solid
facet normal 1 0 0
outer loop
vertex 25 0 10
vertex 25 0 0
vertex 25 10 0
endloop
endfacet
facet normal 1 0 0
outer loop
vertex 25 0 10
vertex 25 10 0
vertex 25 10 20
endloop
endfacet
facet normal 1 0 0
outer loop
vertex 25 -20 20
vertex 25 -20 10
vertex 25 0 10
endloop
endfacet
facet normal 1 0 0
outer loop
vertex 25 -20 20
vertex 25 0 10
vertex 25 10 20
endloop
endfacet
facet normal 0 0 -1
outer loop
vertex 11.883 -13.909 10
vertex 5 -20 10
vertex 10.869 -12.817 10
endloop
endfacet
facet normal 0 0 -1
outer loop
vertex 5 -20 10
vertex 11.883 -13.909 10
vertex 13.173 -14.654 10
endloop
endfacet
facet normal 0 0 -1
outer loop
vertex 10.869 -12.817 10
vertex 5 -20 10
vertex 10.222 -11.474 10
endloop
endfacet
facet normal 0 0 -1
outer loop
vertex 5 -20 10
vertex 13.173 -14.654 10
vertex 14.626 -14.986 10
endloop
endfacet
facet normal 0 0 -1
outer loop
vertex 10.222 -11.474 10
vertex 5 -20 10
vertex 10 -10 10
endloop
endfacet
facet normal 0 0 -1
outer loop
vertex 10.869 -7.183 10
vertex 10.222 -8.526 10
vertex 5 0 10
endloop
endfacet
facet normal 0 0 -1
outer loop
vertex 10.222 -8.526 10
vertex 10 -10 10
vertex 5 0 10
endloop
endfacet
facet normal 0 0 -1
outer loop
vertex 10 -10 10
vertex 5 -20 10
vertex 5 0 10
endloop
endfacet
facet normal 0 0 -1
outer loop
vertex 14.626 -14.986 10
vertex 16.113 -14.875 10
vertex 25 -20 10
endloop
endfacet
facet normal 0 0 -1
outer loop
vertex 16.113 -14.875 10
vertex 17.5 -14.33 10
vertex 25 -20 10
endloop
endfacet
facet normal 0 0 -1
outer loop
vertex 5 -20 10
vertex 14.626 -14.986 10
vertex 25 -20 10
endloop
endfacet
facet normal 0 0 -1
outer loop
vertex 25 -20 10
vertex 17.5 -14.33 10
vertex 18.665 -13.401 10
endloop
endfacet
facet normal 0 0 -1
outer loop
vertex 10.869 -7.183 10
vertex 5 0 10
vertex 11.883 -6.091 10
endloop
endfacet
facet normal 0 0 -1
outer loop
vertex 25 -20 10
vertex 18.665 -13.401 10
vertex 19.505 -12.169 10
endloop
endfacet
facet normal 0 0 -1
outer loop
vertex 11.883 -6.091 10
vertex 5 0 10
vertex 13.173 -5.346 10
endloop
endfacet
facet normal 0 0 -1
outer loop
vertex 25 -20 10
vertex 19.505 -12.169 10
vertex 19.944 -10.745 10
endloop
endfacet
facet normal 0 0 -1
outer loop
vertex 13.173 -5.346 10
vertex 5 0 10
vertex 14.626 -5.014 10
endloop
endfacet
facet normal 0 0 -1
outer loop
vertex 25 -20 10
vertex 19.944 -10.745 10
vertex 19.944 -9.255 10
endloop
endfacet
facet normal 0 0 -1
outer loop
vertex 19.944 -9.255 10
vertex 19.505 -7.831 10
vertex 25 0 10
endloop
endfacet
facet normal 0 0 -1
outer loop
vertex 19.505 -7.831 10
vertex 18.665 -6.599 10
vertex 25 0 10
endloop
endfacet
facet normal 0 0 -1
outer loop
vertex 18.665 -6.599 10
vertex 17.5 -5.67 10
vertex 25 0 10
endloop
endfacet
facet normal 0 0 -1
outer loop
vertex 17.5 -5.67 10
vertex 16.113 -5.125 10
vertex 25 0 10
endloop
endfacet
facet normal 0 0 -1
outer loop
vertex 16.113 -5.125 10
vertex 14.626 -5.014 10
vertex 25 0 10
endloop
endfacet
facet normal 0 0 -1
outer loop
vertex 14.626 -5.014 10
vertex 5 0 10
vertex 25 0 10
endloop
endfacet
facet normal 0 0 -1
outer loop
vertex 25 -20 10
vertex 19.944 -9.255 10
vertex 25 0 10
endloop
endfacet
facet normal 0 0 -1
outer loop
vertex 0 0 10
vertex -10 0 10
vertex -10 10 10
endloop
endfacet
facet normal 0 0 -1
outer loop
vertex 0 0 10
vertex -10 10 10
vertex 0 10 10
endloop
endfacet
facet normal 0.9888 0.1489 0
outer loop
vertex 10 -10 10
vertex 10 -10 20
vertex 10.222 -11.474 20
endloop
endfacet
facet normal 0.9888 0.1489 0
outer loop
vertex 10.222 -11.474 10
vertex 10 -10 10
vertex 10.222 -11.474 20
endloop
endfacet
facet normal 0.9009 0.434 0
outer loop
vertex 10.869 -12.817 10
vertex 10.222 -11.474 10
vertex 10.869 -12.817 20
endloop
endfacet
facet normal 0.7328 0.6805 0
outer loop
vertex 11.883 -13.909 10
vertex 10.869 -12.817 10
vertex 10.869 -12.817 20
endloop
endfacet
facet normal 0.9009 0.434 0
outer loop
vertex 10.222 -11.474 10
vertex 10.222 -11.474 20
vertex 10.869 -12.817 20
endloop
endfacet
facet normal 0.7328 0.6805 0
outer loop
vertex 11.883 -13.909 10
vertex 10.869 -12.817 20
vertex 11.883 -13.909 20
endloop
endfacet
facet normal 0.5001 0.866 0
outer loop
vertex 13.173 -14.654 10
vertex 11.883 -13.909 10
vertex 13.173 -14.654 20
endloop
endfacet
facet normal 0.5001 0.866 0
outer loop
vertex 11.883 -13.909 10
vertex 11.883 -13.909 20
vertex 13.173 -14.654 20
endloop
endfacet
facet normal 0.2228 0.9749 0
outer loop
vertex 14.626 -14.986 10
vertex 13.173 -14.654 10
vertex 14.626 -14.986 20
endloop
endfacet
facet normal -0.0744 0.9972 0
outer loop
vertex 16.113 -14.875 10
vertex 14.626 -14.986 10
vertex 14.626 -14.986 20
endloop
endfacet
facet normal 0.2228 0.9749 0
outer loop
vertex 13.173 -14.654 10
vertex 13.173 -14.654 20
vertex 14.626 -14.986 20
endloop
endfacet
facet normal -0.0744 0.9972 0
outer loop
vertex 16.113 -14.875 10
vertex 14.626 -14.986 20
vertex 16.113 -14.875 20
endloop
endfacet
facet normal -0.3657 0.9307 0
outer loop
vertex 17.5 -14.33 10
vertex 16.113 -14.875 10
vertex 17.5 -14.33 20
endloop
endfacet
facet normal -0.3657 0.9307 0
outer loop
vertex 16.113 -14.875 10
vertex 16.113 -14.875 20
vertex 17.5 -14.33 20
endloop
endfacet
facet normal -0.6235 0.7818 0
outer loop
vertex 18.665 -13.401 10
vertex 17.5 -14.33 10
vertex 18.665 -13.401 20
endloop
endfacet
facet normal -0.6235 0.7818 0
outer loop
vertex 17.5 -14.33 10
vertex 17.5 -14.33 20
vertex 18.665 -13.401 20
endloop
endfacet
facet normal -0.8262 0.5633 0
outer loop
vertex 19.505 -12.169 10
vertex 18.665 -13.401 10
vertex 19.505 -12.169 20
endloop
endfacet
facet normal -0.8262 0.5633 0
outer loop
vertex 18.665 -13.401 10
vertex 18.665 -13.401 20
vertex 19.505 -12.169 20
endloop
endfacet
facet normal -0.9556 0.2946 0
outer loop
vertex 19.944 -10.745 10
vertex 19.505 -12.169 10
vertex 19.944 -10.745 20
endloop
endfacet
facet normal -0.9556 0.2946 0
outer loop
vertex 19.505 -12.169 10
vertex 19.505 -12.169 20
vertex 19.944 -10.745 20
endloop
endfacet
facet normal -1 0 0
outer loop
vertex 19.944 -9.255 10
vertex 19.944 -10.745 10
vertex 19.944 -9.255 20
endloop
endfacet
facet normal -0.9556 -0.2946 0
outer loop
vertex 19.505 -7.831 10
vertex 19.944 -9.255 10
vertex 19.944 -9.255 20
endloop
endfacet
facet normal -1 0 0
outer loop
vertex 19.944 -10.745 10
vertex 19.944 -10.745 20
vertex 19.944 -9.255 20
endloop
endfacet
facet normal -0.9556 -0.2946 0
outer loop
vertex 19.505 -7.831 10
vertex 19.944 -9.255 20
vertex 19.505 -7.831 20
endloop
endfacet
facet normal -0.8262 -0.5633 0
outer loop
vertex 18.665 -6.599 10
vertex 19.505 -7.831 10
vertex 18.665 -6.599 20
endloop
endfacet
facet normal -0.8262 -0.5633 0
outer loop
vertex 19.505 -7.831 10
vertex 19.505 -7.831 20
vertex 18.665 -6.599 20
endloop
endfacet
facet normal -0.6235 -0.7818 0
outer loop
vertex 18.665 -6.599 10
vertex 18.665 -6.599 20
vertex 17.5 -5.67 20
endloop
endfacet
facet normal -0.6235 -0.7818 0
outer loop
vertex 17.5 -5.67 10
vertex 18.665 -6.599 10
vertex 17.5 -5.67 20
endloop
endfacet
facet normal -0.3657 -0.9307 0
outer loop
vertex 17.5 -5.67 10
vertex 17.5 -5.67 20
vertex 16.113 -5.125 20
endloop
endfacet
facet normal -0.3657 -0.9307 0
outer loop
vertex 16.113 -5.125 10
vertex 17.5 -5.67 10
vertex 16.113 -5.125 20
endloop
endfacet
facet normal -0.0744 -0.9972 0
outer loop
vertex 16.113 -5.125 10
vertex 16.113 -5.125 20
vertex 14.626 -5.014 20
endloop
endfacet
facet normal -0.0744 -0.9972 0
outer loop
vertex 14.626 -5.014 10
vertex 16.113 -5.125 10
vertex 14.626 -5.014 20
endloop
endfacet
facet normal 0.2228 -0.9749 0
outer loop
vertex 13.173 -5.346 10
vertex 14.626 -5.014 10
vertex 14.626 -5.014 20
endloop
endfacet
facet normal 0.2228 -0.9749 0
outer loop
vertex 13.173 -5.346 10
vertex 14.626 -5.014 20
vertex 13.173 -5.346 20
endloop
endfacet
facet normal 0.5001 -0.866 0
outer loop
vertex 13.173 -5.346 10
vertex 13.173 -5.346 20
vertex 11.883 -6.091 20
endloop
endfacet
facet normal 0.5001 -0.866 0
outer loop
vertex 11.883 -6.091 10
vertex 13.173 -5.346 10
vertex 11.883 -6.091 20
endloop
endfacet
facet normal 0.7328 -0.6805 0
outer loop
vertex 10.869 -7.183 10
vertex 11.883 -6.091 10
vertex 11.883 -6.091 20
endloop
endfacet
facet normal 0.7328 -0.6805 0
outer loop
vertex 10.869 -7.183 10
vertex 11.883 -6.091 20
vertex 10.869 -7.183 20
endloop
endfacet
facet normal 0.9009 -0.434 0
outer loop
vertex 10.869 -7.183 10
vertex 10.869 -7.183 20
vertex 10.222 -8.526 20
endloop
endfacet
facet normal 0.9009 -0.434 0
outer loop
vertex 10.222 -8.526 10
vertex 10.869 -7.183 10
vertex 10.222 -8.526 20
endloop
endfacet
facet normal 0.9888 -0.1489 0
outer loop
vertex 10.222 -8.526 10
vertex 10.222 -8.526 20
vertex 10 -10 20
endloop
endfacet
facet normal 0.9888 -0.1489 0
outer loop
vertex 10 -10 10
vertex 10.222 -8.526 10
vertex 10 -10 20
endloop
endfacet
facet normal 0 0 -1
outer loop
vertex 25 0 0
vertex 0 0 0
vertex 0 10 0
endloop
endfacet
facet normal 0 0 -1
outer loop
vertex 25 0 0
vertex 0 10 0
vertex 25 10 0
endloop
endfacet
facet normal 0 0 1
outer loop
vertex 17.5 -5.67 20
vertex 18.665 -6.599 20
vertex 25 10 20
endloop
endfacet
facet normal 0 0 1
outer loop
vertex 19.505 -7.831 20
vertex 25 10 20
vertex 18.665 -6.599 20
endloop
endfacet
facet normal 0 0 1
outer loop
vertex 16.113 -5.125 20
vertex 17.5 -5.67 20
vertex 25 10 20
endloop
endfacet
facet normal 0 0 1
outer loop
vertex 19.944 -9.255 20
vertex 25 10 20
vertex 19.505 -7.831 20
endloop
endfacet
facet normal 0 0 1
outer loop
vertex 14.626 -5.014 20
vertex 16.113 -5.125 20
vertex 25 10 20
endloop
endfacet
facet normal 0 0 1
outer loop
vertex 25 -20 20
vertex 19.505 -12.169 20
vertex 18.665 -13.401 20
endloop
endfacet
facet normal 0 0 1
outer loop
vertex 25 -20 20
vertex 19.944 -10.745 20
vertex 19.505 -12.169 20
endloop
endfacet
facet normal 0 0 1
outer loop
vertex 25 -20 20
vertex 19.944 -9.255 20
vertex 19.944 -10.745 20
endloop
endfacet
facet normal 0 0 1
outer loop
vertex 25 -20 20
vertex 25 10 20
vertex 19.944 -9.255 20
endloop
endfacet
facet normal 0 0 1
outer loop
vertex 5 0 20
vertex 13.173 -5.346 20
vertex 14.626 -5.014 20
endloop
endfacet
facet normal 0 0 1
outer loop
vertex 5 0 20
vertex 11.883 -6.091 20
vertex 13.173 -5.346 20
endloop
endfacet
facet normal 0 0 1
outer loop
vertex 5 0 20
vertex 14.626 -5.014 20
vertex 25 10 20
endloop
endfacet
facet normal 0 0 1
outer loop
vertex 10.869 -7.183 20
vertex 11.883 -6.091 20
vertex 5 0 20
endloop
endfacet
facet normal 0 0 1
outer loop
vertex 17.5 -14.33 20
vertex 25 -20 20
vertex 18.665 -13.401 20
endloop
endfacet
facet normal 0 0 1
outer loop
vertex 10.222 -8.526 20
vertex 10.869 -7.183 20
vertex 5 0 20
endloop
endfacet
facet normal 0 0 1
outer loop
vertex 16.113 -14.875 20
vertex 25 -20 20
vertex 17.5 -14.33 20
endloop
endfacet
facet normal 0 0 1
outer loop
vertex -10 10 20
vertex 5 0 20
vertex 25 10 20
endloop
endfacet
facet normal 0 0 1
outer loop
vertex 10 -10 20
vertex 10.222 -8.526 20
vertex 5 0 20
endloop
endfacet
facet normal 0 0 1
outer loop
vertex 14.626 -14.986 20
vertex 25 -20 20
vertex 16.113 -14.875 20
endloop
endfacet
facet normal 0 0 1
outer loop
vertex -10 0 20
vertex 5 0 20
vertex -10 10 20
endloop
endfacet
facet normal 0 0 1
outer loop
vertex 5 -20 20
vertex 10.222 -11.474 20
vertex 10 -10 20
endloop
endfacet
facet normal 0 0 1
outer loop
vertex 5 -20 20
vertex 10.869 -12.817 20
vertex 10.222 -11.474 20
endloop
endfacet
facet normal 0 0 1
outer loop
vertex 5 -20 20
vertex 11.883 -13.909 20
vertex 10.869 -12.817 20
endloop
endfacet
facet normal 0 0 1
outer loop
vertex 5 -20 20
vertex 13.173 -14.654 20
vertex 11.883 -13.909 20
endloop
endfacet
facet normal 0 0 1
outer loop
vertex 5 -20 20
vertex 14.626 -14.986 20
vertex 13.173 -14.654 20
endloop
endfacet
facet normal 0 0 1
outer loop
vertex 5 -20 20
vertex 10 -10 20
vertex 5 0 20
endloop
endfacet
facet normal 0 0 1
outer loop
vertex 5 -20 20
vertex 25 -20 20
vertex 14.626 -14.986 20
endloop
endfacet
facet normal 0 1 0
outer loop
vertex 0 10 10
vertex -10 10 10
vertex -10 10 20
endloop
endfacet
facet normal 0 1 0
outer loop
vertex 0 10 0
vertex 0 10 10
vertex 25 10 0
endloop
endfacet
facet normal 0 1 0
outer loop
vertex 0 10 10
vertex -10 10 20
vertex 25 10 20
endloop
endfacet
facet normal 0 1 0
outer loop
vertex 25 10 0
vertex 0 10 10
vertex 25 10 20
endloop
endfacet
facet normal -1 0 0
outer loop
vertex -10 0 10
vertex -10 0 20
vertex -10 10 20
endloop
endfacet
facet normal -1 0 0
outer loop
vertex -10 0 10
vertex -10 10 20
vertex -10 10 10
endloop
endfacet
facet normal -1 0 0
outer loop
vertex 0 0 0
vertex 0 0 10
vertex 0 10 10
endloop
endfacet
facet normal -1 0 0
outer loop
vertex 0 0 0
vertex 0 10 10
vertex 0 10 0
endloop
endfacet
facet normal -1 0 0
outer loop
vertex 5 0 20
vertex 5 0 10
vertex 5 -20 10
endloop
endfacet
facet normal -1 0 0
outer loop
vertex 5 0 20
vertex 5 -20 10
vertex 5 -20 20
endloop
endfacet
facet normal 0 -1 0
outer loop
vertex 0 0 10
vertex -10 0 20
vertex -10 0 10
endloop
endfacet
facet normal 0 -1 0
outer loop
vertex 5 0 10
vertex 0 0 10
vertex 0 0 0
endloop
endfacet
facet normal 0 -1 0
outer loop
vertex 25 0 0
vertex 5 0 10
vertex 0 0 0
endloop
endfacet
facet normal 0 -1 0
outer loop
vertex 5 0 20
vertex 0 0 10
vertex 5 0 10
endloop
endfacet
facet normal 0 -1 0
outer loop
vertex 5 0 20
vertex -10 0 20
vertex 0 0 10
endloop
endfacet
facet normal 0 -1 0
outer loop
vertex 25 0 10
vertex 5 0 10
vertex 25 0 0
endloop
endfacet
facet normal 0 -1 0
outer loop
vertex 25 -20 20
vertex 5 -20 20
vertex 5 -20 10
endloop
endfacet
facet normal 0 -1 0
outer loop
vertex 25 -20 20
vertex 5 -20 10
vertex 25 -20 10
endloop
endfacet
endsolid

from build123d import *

# Parameters (mm, degrees)
F0_W     = 20
F0_H     = 10
F1_DEPTH = 20
F2_DEPTH = 10
F4_D     = 10


with BuildPart() as f1:
    # F0 (on Front) → F1 (new body)
    with BuildSketch(Plane.XZ):
        with Locations((15, 15)):
            Rectangle(F0_W, F0_H)
    extrude(amount=F1_DEPTH)

    # F0 (on Front) → F2 (join)
    with BuildSketch(Plane.XZ):
        Polygon((0, 10), (0, 0), (25, 0), (25, 10), (5, 10), (5, 20), (-10, 20), (-10, 10), align=None)
        with Locations((15, 15)):
            Rectangle(F0_W, F0_H)
    extrude(amount=-F2_DEPTH)

    # F4 (through all)
    with Locations(Plane(origin=(0, 0, 10), x_dir=(1, 0, 0), z_dir=(0, 0, -1))):
        with Locations((15, 10)):
            Hole(F4_D / 2)


solid = f1.part
